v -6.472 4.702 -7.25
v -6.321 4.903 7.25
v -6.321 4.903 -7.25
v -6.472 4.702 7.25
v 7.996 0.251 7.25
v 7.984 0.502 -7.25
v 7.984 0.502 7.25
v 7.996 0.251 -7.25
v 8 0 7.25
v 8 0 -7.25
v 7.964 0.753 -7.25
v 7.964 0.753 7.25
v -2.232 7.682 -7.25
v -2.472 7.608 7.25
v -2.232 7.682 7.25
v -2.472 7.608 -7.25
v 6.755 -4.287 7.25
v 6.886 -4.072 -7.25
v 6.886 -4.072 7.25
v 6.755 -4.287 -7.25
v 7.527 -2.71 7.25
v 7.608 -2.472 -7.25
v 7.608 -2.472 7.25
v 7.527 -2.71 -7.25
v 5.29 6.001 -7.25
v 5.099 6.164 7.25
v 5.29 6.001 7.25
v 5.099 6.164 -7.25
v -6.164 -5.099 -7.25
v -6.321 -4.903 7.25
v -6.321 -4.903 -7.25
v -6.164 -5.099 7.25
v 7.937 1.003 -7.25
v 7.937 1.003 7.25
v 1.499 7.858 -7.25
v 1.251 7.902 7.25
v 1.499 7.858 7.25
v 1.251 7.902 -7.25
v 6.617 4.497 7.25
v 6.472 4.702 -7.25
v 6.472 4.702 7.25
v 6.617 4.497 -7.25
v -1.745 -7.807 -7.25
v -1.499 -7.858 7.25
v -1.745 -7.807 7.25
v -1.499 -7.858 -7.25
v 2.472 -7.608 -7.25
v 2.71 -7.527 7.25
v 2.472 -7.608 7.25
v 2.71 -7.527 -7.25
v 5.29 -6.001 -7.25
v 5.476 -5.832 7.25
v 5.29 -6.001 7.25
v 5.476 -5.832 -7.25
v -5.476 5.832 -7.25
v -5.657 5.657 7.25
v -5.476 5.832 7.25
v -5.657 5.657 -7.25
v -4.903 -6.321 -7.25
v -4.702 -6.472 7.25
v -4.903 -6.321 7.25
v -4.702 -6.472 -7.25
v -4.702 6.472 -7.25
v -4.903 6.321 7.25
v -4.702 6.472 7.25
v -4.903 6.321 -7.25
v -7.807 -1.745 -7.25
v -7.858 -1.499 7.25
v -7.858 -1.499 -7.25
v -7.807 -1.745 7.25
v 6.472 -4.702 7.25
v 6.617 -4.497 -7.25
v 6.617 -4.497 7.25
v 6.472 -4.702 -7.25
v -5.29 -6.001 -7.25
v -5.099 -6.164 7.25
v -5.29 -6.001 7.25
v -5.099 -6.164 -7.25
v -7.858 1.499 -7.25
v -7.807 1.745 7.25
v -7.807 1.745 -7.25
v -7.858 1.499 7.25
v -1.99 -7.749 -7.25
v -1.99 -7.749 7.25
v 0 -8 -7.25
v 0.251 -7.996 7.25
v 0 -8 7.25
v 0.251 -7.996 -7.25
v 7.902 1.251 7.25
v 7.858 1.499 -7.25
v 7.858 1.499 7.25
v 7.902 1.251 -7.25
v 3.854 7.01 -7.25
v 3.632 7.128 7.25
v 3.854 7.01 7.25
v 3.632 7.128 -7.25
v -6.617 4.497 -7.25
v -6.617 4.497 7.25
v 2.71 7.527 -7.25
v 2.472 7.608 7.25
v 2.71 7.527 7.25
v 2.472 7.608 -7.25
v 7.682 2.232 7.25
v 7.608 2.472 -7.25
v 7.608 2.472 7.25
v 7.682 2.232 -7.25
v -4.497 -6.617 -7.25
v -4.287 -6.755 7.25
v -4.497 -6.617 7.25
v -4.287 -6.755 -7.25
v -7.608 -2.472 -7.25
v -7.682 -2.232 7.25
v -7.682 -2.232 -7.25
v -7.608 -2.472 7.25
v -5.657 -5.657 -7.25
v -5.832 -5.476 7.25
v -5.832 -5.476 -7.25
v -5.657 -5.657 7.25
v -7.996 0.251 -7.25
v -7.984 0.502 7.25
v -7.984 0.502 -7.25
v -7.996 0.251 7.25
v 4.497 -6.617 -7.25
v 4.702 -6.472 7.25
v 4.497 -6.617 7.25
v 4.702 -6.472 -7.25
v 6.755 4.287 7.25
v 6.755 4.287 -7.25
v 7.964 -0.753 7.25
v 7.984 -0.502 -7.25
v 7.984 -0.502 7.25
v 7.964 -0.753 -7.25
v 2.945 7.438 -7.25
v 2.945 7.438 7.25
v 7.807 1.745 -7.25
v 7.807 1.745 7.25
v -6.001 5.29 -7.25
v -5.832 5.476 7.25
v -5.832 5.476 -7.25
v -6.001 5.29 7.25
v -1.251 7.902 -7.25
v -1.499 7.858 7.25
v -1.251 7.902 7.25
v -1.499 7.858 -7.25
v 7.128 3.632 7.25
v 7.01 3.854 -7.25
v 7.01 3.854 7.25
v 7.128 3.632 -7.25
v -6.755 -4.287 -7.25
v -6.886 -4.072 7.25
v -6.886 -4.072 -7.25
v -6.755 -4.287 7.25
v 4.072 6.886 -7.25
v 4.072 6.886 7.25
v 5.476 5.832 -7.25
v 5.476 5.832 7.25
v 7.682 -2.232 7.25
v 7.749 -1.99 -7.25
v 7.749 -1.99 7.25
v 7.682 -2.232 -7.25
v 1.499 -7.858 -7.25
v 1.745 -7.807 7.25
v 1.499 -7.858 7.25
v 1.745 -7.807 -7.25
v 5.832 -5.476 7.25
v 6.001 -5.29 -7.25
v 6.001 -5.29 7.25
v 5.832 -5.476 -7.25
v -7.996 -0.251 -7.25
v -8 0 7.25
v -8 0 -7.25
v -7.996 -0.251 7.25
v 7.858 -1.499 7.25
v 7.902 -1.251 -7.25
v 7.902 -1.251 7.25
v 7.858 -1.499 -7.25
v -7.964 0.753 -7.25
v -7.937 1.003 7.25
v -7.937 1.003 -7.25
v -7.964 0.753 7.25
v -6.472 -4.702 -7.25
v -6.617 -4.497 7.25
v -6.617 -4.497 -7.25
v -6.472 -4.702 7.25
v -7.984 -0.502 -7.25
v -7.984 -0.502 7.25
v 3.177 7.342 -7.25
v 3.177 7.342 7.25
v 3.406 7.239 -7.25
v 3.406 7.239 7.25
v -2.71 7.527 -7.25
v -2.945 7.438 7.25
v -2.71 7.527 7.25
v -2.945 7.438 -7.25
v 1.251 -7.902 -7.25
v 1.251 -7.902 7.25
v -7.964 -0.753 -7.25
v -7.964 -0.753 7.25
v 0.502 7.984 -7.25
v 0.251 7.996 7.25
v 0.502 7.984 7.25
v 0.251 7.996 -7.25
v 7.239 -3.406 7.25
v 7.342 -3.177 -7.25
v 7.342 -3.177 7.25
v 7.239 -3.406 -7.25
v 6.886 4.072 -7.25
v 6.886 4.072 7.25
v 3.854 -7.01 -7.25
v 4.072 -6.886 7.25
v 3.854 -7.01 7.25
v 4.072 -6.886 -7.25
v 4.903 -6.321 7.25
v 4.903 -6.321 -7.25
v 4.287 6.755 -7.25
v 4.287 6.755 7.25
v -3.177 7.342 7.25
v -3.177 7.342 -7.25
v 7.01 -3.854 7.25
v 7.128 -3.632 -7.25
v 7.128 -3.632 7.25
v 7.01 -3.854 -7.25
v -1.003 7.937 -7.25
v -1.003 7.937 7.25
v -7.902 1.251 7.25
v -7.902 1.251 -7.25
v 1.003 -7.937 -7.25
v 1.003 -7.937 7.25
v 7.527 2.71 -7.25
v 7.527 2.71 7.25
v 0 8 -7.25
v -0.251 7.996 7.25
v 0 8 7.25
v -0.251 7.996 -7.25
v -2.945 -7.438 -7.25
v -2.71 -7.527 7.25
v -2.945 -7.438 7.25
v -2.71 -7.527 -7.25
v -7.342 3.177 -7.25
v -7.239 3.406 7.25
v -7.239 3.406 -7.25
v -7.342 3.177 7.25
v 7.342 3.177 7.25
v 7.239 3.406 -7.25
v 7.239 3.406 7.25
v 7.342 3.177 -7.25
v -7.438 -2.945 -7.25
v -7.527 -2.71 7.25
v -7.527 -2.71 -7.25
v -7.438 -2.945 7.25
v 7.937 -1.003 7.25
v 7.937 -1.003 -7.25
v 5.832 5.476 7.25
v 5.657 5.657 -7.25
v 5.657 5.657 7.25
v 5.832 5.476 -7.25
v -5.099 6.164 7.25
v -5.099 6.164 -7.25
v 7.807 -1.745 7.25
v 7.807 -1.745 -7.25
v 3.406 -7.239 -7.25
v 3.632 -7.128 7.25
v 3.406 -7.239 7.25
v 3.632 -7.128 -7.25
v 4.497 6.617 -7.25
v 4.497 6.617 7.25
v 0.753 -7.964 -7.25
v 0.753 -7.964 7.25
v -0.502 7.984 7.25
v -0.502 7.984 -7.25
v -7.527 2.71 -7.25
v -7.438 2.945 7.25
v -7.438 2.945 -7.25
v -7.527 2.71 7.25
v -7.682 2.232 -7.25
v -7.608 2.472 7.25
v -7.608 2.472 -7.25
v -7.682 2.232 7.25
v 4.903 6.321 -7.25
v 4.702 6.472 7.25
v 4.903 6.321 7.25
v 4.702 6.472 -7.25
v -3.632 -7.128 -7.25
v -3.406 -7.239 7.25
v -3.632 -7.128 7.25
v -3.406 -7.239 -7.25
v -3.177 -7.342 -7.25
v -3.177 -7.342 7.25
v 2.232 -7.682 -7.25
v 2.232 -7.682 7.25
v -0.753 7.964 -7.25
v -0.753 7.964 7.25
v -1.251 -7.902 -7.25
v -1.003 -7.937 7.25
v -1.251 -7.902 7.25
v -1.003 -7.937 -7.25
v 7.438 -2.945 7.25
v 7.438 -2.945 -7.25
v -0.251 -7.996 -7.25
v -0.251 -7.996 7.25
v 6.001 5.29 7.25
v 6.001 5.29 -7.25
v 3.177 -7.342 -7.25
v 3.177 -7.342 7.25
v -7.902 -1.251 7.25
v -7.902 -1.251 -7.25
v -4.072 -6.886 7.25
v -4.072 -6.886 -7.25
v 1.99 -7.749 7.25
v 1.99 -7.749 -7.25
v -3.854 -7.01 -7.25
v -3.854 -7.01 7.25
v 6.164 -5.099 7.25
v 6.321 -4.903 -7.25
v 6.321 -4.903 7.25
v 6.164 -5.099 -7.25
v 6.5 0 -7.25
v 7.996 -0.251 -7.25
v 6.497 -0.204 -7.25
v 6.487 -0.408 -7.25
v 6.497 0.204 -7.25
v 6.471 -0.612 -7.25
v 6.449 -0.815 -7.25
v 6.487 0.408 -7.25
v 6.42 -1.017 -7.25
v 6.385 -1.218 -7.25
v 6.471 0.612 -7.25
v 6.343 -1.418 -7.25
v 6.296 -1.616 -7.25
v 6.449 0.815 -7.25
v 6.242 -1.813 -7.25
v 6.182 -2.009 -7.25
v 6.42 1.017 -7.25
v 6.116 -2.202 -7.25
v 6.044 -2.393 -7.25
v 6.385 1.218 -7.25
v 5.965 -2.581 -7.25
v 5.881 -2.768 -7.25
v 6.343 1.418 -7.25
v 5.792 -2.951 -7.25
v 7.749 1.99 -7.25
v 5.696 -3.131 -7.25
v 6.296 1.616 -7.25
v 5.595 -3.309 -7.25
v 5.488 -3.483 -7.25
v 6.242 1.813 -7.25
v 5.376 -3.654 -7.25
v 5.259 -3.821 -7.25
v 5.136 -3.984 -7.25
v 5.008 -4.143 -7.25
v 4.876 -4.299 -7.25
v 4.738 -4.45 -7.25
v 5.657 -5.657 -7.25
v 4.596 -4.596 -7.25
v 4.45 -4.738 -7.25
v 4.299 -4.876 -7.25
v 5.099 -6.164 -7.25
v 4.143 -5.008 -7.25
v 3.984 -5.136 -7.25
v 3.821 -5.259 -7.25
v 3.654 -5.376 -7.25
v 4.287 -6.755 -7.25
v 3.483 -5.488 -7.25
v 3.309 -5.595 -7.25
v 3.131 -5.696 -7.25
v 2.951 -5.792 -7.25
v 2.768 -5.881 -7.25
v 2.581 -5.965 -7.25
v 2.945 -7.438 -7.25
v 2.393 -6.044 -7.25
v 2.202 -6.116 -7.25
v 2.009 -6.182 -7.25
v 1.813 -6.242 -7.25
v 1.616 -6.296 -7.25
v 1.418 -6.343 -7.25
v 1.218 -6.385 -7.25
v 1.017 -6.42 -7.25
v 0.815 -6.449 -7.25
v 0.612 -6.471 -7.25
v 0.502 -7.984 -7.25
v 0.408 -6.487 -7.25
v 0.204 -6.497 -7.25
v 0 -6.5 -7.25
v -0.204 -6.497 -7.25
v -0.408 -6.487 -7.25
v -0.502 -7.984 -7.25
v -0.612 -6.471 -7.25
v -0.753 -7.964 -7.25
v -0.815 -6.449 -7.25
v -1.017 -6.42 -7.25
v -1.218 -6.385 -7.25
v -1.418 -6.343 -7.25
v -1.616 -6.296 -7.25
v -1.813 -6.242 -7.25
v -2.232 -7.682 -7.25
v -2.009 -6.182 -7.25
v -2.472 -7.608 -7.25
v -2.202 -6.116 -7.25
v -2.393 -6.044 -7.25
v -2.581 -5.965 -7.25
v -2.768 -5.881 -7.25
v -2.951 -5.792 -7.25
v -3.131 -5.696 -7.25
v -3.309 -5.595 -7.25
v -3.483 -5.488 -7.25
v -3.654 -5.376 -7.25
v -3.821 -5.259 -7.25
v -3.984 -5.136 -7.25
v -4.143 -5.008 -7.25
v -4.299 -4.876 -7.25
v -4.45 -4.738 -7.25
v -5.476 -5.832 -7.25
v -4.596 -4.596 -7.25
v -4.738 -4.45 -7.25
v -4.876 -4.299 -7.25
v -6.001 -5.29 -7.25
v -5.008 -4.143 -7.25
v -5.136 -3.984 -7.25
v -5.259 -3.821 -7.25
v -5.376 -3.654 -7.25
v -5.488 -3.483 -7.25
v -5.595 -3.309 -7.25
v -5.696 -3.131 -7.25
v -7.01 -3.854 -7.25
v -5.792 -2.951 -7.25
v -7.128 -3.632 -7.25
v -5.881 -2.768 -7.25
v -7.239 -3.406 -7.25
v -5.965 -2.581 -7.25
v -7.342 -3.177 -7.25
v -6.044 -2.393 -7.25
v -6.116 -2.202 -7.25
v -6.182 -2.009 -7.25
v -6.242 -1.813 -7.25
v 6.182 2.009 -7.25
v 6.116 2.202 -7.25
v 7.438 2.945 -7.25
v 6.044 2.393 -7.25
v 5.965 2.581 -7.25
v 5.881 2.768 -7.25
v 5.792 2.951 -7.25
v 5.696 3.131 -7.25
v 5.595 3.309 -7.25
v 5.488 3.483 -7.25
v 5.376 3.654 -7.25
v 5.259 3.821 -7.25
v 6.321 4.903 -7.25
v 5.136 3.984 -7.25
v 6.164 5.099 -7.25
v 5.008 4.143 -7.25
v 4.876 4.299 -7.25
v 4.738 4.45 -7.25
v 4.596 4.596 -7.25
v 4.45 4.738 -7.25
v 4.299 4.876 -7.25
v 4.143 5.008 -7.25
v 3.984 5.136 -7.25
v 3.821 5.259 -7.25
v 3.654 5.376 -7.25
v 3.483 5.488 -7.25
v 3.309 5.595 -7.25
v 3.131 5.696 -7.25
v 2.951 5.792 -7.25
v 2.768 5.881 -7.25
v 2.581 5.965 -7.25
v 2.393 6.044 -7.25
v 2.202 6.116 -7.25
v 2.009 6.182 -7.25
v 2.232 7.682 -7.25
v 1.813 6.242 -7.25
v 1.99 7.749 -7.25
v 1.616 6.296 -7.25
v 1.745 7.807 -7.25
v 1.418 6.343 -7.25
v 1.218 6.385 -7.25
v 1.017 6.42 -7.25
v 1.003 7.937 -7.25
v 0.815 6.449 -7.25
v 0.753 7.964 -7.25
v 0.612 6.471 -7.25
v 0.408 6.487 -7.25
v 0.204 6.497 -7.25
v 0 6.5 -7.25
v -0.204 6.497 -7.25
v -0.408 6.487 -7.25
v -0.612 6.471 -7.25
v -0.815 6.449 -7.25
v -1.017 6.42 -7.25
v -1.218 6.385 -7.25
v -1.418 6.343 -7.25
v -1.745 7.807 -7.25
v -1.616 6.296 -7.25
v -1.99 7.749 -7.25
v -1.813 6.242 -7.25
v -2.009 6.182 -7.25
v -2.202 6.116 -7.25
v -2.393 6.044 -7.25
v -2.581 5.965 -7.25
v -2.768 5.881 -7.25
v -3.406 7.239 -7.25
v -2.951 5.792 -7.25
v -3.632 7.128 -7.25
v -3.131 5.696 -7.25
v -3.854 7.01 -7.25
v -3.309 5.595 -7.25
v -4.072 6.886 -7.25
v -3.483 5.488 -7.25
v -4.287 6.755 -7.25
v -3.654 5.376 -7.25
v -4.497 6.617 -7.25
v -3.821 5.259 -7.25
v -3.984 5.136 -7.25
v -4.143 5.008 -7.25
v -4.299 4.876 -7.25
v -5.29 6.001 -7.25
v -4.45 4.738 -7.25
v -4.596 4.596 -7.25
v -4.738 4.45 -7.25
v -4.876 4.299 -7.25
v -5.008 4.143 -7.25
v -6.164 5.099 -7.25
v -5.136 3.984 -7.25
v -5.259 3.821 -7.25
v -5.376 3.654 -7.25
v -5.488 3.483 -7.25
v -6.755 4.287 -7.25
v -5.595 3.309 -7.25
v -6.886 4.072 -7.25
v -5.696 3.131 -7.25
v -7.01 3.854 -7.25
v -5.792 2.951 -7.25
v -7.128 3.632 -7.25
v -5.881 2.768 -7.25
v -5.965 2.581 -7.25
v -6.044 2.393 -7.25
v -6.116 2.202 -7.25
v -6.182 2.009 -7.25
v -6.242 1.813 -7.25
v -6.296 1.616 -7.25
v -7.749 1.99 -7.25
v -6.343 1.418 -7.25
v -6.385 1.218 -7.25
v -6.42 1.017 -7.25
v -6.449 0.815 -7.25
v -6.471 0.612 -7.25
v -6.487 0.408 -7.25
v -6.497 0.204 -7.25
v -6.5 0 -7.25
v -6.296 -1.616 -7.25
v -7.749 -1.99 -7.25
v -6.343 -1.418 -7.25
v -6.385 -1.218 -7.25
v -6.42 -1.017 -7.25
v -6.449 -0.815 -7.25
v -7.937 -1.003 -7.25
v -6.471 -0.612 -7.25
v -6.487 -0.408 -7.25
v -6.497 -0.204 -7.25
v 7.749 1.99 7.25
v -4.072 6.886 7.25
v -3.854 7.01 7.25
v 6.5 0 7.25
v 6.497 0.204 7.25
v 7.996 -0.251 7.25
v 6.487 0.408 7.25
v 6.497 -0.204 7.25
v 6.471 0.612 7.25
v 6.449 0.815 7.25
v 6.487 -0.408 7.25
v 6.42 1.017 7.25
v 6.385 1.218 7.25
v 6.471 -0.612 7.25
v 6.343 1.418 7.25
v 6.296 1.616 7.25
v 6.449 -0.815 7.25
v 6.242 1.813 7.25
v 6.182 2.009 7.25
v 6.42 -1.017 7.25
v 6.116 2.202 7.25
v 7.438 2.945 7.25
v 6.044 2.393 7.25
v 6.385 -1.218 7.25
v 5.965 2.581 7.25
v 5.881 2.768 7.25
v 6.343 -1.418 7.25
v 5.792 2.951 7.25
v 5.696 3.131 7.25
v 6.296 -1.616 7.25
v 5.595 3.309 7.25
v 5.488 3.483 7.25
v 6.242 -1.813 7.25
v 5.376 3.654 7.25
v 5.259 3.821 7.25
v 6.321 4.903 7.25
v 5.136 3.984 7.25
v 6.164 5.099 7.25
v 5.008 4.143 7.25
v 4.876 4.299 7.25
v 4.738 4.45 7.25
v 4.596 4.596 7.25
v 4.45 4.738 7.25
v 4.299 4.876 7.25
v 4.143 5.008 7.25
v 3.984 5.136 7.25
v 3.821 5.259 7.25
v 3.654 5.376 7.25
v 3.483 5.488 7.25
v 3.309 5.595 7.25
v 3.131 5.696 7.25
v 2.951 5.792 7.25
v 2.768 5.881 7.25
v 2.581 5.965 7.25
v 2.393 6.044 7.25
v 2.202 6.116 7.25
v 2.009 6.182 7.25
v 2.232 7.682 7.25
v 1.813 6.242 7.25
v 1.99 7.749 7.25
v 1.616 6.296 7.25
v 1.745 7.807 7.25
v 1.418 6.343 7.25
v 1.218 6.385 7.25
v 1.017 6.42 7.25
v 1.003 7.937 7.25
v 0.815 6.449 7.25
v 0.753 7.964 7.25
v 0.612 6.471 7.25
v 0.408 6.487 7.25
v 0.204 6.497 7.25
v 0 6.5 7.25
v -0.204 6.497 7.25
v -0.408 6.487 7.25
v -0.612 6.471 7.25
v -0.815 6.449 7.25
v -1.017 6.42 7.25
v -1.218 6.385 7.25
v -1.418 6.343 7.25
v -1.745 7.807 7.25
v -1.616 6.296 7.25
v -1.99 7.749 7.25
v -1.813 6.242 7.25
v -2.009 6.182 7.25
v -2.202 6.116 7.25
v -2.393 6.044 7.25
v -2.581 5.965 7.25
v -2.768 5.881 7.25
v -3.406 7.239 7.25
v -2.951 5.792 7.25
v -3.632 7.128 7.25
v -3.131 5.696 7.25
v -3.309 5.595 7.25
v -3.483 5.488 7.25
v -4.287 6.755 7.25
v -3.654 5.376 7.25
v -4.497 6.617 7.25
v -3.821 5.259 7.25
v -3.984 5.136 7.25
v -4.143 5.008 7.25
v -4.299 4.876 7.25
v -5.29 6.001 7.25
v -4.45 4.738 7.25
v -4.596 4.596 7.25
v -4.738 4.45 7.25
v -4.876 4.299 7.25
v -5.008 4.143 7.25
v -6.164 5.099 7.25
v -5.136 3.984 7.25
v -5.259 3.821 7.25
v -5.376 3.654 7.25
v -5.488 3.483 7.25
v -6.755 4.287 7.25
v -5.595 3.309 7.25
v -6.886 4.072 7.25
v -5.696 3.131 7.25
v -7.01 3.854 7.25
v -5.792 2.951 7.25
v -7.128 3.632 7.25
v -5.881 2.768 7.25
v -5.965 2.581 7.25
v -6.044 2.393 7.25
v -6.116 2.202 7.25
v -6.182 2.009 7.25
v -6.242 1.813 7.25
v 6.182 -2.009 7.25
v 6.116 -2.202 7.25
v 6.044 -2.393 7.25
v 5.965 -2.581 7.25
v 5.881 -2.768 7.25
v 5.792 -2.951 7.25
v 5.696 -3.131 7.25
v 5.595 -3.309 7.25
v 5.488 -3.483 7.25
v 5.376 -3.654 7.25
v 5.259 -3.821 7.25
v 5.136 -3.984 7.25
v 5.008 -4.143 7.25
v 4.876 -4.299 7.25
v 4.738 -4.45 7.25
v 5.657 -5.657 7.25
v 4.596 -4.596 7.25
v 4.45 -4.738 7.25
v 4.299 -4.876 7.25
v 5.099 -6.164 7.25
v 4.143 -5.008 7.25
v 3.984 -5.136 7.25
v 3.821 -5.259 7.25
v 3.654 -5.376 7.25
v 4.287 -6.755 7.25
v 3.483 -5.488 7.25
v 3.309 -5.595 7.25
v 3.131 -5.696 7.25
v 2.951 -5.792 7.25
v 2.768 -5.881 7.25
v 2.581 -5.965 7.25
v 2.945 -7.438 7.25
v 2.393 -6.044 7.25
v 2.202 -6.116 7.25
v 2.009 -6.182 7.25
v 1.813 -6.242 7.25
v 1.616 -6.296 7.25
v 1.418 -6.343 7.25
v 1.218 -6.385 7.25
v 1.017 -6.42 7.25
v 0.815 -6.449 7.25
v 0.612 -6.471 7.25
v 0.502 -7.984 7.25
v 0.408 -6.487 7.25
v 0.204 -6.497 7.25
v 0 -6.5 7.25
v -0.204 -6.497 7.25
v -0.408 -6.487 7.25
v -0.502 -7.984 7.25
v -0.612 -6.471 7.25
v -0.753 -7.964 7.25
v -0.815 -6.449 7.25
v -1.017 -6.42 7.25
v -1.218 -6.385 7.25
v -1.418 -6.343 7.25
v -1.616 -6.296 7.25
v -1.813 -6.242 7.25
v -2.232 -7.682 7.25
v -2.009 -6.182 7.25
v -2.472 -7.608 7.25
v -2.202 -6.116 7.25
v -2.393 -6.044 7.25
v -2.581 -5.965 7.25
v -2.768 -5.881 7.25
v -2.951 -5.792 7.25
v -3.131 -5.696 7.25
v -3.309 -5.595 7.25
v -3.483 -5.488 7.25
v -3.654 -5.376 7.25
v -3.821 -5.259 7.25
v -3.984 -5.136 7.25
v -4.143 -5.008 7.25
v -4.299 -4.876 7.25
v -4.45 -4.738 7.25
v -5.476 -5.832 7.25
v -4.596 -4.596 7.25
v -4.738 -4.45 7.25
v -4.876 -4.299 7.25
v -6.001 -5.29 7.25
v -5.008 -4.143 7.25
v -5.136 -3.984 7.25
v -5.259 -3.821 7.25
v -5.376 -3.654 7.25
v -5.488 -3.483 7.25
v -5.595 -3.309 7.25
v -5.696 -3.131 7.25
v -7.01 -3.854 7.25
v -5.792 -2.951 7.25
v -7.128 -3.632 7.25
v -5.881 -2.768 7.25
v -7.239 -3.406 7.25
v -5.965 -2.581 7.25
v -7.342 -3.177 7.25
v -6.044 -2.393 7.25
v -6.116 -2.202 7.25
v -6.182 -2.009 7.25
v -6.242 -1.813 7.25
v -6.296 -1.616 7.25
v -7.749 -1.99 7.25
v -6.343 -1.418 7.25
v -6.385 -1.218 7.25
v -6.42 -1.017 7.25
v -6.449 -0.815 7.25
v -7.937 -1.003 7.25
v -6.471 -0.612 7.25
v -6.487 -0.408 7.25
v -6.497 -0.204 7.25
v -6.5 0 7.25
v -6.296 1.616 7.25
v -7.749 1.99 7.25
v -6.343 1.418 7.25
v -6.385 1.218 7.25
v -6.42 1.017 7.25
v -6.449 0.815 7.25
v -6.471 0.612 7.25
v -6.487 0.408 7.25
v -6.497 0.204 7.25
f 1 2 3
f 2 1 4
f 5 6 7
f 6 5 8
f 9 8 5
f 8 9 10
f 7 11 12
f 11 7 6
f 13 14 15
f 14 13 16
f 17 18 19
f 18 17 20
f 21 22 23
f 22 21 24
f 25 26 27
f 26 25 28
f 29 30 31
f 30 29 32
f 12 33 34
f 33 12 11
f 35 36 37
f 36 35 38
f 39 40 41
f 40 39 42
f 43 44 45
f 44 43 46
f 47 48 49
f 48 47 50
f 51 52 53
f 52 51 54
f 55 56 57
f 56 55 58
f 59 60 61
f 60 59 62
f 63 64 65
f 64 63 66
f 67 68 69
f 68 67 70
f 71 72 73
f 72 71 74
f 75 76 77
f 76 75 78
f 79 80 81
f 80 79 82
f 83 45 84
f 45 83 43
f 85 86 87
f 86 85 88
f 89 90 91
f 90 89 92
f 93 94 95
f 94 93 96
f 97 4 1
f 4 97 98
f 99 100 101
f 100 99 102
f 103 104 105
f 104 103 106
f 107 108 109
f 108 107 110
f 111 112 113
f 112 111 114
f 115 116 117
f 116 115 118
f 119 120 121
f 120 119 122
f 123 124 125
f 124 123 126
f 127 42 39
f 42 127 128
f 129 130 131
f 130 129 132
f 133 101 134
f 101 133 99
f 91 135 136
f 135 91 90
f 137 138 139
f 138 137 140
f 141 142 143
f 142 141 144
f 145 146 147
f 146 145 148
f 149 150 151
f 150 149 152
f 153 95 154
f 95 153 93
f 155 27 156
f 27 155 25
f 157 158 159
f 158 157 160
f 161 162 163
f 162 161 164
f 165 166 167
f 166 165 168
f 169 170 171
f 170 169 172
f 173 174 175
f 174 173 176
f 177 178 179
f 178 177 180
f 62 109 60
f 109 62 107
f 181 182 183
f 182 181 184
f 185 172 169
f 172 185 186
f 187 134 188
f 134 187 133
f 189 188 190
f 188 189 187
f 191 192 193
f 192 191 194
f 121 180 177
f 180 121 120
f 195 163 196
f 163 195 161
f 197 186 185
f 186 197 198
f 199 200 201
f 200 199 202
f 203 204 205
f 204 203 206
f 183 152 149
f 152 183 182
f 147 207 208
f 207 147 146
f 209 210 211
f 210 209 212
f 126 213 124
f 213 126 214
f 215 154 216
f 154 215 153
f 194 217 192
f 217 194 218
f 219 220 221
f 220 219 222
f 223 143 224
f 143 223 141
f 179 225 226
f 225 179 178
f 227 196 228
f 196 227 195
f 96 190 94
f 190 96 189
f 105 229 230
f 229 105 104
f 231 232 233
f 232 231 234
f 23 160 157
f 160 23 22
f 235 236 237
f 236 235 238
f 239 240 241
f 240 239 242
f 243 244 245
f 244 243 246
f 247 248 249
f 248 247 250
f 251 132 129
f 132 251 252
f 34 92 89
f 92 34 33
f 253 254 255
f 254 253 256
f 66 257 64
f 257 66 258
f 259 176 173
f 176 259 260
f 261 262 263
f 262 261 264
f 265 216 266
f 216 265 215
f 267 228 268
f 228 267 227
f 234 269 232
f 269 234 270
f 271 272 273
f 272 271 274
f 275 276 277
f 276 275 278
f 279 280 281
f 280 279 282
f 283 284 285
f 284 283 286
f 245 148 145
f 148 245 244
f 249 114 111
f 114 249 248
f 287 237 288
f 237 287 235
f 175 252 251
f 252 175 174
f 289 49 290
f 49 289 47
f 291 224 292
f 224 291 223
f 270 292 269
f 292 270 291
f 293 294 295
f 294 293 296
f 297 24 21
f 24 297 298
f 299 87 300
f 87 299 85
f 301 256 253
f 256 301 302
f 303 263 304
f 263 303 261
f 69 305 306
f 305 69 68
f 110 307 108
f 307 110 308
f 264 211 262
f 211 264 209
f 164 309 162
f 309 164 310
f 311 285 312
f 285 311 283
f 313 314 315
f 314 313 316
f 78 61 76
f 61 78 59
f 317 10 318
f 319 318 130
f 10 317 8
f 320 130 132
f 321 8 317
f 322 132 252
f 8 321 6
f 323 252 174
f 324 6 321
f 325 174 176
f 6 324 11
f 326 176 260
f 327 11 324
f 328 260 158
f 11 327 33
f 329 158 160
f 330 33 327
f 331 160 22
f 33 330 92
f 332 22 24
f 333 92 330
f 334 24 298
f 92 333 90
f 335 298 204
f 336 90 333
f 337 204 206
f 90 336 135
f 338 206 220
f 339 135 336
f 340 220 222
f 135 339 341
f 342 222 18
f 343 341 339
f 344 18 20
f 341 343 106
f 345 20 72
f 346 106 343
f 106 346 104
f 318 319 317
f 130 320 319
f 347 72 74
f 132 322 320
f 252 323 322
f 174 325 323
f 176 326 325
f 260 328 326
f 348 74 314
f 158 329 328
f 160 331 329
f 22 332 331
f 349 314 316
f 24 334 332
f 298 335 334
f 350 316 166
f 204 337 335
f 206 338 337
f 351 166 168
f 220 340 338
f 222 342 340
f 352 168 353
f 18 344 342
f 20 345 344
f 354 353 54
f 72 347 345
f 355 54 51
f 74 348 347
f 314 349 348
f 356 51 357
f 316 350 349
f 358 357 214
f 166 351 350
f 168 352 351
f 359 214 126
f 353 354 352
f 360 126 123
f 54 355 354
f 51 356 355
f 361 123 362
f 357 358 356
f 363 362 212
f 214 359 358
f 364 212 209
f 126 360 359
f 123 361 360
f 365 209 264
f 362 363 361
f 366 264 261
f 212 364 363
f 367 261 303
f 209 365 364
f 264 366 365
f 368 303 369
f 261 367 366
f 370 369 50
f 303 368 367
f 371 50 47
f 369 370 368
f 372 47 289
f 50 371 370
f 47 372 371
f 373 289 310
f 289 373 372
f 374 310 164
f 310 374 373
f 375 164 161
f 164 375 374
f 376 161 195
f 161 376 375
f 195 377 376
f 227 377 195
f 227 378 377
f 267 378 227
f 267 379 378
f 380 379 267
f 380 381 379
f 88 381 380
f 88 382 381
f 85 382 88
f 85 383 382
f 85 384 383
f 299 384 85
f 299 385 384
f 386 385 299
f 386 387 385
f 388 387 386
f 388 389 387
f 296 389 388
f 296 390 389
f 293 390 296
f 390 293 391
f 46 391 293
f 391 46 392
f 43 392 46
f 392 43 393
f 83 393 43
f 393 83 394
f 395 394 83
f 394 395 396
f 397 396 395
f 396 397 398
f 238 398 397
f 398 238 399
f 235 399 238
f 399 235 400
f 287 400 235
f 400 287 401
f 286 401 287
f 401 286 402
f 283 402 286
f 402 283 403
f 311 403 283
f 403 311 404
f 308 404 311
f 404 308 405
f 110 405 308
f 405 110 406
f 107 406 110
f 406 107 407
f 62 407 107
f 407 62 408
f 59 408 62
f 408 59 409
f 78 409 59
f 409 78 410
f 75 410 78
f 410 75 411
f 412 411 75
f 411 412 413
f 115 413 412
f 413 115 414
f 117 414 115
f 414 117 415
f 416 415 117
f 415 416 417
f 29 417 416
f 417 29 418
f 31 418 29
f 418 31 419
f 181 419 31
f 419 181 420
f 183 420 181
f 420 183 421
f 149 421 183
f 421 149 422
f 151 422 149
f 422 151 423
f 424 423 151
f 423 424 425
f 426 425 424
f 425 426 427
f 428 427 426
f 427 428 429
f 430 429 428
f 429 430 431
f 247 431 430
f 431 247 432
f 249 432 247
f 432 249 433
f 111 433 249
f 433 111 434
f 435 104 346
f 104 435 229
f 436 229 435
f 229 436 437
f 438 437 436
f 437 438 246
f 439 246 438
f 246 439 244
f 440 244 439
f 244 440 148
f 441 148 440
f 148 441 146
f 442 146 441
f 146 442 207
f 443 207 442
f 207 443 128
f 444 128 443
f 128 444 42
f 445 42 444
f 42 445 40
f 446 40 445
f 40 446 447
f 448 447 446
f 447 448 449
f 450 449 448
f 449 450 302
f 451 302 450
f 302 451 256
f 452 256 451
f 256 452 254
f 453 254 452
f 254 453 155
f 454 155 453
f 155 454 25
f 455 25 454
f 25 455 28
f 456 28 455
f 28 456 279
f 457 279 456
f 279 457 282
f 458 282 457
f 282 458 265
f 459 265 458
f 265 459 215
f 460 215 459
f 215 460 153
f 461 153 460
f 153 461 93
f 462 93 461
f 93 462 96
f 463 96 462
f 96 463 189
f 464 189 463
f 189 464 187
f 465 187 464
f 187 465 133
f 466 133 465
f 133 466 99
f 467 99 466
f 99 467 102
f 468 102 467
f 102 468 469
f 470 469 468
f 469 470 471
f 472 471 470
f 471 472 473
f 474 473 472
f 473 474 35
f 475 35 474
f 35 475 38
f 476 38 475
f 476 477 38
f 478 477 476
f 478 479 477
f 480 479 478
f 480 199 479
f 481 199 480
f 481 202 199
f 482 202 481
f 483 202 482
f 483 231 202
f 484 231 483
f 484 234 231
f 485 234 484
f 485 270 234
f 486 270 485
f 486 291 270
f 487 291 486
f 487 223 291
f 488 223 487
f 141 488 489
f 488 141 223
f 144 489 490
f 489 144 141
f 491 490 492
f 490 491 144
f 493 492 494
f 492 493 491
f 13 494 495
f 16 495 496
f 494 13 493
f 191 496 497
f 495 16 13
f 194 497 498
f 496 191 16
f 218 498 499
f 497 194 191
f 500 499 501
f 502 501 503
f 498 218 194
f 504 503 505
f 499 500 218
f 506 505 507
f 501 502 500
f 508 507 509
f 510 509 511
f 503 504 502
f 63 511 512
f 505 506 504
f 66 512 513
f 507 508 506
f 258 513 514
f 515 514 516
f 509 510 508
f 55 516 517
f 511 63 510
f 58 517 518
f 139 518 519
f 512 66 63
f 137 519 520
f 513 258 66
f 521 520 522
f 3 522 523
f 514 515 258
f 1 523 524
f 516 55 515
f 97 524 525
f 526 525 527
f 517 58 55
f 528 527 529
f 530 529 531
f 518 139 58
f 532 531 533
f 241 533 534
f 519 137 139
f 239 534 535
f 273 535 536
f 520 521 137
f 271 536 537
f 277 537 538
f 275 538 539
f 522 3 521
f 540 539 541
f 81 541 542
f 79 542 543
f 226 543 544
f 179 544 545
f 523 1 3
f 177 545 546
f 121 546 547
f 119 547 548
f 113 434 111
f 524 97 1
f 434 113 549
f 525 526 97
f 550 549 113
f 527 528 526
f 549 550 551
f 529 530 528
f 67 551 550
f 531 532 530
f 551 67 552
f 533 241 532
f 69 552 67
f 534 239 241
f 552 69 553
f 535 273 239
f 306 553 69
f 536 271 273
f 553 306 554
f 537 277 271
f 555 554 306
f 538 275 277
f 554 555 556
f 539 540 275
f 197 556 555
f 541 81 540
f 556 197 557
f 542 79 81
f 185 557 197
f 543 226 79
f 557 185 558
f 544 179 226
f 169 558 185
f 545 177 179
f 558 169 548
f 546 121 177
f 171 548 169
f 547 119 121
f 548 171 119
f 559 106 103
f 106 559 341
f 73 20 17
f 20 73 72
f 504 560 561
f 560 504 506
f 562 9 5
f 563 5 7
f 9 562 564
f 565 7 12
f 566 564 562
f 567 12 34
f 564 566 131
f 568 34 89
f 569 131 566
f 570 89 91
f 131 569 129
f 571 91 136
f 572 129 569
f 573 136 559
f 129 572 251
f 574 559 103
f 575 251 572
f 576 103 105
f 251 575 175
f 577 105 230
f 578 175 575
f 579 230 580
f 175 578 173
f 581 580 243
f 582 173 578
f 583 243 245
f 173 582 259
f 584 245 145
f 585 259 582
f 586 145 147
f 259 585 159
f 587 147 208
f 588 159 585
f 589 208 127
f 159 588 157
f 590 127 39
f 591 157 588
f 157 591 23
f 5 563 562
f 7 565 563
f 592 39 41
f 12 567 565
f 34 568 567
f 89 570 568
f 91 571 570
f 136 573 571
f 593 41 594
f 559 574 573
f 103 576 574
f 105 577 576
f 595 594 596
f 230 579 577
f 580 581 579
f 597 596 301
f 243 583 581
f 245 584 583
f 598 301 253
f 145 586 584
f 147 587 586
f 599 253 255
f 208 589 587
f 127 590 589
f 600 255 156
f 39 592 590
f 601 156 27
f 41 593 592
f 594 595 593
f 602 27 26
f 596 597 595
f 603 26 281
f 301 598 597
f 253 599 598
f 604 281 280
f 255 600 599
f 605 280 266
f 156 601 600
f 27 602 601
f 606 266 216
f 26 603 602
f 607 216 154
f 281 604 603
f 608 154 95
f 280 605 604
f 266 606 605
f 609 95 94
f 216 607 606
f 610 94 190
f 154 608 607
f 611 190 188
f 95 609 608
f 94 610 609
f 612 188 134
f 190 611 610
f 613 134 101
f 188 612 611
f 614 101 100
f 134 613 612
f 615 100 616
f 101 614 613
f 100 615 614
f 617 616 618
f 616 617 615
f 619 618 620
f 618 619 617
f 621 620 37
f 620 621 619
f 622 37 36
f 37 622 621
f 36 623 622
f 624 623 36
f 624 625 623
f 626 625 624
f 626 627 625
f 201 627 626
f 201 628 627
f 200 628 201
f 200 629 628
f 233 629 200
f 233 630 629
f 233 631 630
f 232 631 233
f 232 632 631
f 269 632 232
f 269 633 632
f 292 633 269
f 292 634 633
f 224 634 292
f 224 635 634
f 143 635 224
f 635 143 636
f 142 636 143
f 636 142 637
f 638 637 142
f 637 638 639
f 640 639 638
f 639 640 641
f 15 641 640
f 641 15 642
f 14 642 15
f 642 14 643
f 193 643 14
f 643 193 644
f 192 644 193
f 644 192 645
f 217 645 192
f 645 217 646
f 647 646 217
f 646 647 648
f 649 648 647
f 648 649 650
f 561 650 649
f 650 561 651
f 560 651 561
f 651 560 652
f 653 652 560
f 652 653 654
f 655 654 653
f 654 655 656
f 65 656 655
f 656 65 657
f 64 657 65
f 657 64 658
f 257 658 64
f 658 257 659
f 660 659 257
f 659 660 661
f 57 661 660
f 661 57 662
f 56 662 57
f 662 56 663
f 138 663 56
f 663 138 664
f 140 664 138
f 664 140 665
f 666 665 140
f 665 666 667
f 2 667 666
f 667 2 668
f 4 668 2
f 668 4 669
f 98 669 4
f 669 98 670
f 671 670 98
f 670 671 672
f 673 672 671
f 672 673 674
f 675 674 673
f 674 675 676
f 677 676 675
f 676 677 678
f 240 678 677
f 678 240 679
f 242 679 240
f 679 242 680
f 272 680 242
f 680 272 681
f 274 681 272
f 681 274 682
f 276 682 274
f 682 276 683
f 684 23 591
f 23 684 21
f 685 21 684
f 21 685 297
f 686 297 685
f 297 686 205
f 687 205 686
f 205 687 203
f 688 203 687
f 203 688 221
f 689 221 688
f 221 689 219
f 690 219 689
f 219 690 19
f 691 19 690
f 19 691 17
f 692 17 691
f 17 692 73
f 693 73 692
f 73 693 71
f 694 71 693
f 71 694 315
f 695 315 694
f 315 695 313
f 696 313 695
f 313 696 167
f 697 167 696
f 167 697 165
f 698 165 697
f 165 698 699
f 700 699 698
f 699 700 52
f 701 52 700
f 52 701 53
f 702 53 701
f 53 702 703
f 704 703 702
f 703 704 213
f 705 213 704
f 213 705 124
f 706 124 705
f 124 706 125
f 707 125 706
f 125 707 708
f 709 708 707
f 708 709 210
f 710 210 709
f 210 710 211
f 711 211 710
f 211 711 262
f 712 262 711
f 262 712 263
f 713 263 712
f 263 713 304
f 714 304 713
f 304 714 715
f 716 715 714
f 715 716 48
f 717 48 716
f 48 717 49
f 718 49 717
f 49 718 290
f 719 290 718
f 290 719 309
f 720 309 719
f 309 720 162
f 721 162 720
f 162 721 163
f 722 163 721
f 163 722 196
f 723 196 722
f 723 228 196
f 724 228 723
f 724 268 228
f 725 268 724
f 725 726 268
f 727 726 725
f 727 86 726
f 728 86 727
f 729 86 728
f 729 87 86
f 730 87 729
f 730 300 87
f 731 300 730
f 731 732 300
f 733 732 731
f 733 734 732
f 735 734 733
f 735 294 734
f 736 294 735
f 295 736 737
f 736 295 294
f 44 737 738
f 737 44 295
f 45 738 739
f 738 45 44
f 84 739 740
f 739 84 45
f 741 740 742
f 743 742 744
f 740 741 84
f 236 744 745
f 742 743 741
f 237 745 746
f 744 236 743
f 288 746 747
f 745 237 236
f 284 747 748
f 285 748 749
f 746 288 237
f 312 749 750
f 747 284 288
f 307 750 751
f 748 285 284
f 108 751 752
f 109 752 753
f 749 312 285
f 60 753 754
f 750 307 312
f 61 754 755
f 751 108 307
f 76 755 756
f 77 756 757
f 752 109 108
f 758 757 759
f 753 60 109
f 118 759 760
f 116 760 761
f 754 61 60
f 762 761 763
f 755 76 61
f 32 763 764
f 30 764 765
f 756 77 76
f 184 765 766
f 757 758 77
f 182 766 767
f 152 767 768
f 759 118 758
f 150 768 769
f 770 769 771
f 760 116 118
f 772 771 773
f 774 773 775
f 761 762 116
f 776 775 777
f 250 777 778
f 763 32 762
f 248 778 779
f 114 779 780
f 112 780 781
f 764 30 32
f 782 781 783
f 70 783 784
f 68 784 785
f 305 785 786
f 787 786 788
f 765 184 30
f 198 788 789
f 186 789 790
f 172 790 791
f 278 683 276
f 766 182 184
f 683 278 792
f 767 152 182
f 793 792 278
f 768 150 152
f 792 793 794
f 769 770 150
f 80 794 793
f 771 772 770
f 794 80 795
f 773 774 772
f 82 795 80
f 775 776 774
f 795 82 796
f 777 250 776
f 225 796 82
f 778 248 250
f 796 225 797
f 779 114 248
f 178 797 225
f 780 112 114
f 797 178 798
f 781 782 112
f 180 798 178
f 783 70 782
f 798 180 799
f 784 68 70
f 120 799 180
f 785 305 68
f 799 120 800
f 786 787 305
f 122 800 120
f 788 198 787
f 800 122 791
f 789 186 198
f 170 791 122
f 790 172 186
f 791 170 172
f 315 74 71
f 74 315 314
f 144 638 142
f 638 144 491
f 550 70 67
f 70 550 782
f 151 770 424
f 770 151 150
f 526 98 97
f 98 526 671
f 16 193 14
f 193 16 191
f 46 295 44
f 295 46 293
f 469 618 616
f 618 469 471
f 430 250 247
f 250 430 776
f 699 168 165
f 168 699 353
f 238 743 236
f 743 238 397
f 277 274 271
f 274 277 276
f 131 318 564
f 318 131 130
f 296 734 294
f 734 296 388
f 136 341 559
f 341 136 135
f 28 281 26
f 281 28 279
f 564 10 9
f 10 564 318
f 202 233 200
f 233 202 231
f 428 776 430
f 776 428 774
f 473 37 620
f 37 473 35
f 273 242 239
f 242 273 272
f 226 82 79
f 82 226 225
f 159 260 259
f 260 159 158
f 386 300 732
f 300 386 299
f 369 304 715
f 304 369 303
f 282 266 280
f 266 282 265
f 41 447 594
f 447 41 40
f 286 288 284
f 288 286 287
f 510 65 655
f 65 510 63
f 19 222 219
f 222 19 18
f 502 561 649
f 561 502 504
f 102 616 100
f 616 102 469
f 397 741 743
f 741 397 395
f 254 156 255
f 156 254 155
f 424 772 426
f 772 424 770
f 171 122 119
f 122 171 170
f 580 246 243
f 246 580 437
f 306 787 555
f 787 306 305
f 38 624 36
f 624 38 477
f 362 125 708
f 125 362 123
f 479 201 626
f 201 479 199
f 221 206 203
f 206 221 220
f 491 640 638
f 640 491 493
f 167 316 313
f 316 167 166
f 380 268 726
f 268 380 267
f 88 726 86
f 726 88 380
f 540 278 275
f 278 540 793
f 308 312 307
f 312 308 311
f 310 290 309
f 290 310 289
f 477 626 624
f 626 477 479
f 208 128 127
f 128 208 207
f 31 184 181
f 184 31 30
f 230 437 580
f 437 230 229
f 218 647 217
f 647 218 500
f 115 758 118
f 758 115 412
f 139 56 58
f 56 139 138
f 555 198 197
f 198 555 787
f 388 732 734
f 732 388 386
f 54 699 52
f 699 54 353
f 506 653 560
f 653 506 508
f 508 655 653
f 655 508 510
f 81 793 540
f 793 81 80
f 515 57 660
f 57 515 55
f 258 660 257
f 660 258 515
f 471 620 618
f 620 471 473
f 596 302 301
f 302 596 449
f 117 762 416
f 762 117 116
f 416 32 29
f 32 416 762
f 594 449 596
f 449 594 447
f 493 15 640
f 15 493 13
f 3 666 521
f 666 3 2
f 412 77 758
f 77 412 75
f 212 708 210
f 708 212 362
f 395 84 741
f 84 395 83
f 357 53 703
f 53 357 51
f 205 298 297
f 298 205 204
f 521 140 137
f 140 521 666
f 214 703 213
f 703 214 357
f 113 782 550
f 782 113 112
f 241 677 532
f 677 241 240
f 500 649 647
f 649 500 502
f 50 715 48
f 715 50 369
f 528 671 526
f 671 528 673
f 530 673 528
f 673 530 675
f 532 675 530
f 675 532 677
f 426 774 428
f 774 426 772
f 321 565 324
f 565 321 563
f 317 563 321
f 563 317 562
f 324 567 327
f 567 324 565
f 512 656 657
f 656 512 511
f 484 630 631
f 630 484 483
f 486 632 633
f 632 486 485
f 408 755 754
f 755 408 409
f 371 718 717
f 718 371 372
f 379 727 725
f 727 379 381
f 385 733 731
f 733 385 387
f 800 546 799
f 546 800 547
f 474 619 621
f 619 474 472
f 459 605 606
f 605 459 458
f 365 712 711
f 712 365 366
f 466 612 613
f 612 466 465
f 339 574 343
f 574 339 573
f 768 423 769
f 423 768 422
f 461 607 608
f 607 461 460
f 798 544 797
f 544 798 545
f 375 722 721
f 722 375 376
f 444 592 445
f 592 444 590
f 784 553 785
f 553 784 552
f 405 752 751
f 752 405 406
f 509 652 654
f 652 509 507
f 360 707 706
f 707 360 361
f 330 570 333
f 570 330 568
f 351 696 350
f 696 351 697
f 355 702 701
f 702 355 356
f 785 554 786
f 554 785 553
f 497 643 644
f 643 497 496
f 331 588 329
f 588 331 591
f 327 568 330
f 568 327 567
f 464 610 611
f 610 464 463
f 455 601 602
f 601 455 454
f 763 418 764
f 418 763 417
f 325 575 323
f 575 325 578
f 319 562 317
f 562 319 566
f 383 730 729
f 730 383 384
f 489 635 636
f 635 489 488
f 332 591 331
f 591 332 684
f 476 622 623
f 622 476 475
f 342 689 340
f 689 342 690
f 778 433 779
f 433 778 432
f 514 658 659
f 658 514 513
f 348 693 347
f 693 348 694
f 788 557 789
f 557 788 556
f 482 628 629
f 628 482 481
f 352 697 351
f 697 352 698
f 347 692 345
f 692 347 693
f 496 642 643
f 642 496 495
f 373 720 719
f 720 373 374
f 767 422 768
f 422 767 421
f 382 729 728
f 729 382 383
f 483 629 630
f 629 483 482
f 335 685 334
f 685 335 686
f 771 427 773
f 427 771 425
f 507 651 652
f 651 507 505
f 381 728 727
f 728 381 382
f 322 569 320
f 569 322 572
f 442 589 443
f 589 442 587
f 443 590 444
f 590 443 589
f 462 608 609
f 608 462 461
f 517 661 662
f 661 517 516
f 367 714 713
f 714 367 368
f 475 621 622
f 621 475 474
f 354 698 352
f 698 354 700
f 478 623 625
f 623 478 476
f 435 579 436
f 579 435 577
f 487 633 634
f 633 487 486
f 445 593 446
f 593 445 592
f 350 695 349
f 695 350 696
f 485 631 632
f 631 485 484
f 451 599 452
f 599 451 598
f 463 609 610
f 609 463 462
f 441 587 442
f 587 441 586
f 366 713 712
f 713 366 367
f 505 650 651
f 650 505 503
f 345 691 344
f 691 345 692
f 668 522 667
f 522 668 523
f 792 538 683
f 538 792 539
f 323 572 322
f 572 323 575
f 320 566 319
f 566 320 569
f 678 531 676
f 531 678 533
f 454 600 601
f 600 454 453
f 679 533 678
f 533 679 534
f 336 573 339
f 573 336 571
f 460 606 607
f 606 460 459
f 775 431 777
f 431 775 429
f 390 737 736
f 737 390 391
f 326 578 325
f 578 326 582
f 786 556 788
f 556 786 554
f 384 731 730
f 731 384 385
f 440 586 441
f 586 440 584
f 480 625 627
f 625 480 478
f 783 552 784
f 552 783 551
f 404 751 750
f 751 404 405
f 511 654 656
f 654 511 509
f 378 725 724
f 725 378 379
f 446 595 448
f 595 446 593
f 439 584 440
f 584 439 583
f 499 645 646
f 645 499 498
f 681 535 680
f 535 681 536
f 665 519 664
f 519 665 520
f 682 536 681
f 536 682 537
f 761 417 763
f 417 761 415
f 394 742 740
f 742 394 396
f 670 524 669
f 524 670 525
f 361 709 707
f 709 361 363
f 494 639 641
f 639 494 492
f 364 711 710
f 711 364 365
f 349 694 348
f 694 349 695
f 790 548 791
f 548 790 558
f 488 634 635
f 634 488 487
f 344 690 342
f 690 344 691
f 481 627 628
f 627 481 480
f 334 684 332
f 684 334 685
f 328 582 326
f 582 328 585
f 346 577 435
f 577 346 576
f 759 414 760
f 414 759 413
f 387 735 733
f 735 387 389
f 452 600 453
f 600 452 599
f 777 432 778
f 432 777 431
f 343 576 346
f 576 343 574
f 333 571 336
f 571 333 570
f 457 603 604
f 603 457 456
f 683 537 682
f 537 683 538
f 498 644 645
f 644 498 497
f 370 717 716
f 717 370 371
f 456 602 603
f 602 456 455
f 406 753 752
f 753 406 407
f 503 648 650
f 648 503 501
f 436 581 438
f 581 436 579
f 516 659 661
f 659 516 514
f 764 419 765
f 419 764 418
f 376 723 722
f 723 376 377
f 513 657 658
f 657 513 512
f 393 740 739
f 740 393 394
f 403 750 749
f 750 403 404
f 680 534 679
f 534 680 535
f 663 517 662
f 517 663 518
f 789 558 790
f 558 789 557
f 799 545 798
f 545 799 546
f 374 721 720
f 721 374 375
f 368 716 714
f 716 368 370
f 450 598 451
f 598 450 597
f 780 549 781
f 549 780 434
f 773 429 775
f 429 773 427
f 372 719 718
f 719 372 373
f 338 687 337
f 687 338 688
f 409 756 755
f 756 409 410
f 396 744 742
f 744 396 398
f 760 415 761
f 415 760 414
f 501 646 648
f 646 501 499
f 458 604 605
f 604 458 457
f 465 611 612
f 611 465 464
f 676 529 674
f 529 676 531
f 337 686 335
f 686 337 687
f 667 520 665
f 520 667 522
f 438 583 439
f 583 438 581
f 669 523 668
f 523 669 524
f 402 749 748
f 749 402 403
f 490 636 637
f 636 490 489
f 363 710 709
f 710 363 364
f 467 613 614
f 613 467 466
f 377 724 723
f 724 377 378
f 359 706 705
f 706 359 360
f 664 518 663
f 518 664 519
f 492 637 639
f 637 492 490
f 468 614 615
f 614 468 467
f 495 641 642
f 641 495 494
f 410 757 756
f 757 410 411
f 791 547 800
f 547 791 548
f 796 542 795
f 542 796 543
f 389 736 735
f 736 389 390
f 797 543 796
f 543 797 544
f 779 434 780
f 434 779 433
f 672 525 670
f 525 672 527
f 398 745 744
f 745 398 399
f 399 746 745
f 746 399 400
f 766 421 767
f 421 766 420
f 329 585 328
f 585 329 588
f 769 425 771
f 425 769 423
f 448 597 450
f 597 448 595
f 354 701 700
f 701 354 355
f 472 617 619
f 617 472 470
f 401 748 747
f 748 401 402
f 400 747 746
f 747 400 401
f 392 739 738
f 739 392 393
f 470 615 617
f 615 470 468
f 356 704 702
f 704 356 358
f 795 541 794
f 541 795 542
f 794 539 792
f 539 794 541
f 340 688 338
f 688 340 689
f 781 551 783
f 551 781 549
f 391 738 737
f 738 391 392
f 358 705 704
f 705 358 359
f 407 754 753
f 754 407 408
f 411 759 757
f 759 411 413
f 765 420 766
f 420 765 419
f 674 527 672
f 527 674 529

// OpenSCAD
$fn = 200;

difference() {
  cylinder(14.5, 8, 8, true);
  cylinder(14.6, 6.5, 6.5, true);
}
